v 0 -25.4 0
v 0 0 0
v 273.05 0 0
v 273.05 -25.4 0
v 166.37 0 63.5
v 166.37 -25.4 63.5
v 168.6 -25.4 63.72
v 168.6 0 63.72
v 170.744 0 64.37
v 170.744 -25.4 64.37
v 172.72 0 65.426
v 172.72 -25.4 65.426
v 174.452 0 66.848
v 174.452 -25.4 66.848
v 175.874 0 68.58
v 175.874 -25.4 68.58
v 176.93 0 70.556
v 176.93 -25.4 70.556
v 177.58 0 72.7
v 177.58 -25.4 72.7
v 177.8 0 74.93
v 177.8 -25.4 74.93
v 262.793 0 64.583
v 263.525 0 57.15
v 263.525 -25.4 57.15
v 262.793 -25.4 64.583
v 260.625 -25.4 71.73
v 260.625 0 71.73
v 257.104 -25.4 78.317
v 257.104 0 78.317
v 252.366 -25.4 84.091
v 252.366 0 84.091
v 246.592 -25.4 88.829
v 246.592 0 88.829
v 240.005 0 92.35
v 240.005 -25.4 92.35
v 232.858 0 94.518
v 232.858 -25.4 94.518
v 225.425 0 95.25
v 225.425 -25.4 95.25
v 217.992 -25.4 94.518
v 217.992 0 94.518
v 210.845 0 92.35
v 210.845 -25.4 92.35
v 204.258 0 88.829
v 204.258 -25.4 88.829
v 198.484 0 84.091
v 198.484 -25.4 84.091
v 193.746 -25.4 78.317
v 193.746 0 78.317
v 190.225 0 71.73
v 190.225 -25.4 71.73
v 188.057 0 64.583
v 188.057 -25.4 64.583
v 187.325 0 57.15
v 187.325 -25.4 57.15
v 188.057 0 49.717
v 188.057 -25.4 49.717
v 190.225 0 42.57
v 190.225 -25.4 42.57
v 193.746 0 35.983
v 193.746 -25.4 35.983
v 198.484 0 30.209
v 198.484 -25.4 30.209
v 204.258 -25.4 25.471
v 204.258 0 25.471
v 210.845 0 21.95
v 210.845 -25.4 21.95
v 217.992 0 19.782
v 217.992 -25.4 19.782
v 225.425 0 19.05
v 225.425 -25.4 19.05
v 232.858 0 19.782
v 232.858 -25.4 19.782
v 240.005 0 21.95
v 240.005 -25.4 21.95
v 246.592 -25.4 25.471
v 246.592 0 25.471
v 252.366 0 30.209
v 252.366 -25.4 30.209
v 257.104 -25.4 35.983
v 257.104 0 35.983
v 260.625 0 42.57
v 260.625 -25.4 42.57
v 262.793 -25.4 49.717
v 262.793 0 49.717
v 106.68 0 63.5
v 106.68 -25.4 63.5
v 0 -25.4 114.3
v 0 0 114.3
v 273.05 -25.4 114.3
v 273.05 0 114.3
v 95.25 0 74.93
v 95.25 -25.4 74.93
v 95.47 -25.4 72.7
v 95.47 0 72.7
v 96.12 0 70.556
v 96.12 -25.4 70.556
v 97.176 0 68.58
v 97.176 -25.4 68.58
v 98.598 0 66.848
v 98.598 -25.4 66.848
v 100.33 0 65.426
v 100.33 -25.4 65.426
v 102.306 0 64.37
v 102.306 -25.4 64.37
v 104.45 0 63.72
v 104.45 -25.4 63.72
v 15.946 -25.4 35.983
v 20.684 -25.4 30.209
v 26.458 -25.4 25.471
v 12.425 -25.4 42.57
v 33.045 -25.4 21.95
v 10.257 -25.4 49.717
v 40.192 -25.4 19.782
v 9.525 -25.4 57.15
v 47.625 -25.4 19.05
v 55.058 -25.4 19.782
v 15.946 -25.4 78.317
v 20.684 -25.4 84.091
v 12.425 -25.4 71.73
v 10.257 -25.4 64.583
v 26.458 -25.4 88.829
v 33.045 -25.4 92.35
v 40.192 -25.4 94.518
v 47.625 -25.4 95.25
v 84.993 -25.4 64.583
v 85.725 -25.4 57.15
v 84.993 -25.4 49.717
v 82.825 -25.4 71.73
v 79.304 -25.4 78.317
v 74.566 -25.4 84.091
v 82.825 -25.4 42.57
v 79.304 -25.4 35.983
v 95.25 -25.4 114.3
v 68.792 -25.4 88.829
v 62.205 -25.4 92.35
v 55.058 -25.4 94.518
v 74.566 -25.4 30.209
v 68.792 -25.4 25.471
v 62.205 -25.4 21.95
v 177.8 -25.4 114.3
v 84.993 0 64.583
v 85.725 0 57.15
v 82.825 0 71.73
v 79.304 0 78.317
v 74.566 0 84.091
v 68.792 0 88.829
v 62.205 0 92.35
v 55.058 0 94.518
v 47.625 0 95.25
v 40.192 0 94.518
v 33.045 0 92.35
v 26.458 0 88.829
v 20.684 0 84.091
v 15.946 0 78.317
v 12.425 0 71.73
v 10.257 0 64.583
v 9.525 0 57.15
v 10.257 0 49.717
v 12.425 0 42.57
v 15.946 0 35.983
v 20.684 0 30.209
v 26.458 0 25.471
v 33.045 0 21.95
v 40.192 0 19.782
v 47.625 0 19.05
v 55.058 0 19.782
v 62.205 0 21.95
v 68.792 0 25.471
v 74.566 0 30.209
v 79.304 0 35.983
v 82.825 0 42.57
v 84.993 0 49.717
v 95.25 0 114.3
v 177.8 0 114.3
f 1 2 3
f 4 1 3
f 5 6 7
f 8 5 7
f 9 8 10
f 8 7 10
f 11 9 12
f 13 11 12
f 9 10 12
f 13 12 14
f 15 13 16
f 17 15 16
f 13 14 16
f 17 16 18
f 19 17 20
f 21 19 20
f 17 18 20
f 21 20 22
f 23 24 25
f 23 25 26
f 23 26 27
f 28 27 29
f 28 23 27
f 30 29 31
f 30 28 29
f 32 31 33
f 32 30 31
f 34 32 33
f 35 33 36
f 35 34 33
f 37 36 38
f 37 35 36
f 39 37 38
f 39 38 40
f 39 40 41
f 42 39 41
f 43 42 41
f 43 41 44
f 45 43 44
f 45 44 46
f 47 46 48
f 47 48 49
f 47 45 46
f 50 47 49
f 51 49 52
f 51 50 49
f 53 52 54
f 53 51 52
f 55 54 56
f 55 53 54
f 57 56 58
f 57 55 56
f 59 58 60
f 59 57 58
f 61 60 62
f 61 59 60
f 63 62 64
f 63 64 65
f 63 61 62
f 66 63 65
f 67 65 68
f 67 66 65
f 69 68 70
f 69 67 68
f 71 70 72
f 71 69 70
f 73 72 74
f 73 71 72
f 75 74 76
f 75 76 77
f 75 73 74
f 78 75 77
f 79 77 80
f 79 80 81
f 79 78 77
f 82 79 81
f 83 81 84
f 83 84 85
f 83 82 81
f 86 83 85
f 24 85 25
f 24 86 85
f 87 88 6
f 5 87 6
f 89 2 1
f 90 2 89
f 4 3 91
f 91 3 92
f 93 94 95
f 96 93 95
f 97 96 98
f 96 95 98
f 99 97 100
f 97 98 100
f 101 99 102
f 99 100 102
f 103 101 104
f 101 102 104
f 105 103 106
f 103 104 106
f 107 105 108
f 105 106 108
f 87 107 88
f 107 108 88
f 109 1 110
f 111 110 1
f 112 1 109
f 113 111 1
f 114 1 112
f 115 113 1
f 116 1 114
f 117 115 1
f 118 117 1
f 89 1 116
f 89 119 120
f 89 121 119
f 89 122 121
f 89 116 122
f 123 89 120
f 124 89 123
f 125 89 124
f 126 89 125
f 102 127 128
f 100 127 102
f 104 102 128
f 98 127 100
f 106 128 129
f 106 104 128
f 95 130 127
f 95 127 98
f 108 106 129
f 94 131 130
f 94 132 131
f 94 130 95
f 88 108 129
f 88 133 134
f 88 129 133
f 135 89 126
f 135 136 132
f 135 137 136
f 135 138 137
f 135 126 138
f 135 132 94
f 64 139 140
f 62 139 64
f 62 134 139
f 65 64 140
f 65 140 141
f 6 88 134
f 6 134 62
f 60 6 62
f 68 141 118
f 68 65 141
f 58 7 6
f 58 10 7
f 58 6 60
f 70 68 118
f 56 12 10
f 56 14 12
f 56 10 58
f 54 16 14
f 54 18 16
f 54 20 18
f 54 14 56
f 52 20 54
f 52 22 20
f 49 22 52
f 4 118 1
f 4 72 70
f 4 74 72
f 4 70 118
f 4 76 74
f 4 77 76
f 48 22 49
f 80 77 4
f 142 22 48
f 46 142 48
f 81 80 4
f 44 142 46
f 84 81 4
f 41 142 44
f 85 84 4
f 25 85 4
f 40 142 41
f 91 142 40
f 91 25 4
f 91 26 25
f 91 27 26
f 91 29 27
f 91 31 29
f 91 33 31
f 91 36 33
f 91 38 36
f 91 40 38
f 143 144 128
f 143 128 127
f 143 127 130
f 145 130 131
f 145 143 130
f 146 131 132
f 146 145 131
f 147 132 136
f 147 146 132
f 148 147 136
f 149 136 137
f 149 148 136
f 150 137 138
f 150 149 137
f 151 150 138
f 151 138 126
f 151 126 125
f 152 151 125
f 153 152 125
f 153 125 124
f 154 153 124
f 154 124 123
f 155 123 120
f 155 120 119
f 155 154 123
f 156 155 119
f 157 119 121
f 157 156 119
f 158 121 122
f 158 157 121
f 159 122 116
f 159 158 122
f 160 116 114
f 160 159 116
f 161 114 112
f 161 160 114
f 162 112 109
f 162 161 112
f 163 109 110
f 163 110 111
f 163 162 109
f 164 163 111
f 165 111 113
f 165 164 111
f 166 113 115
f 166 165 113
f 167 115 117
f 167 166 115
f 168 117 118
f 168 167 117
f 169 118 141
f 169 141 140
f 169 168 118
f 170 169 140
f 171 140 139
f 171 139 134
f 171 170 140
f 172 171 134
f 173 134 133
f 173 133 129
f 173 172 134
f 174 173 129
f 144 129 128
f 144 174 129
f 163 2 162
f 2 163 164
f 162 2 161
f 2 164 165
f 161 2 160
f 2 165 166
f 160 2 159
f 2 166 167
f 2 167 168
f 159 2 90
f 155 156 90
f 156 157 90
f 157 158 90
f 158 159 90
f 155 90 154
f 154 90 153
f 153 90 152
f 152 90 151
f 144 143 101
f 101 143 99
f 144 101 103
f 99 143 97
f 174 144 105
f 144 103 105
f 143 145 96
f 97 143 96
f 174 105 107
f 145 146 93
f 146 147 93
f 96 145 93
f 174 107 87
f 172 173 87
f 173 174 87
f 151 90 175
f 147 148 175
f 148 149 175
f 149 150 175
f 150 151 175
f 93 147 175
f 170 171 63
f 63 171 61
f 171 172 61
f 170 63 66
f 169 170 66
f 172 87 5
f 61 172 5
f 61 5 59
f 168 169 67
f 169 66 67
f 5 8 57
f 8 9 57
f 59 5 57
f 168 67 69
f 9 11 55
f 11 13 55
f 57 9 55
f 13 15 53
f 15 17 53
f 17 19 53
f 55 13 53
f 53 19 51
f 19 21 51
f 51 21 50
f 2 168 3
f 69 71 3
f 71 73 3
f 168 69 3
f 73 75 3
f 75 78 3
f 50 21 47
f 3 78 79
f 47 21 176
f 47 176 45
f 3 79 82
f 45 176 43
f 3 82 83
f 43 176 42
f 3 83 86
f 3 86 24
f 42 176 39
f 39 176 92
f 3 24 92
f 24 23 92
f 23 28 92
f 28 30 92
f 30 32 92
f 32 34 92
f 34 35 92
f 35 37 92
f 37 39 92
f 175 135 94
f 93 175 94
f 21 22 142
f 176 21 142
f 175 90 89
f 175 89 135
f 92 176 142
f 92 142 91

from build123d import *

# Parameters (mm, degrees)
F0_W     = 273.05
F0_H     = 114.3
F0_R     = 38.1
F1_DEPTH = 25.4
F3_DEPTH = 25.4


with BuildPart() as f1:
    # F0 (on Front) → F1 (new body)
    with BuildSketch(Plane.XZ):
        with Locations((136.525, 57.15)):
            Rectangle(F0_W, F0_H)
        with Locations((47.625, 57.15)):
            Circle(F0_R, mode=Mode.SUBTRACT)
        with Locations((225.425, 57.15)):
            Circle(F0_R, mode=Mode.SUBTRACT)
    extrude(amount=F1_DEPTH)

    # F2 (on face) → F3 (cut)
    with BuildSketch(Plane.XZ.offset(25.4)):
        with BuildLine():
            Line((177.8, 114.3), (95.25, 114.3))
            Line((95.25, 114.3), (95.25, 74.93))
            ThreePointArc((95.25, 74.93), (98.597769, 66.847769), (106.68, 63.5))
            Line((106.68, 63.5), (166.37, 63.5))
            ThreePointArc((166.37, 63.5), (174.452231, 66.847769), (177.8, 74.93))
            Line((177.8, 74.93), (177.8, 114.3))
        make_face()
    extrude(amount=-F3_DEPTH, mode=Mode.SUBTRACT)


solid = f1.part
